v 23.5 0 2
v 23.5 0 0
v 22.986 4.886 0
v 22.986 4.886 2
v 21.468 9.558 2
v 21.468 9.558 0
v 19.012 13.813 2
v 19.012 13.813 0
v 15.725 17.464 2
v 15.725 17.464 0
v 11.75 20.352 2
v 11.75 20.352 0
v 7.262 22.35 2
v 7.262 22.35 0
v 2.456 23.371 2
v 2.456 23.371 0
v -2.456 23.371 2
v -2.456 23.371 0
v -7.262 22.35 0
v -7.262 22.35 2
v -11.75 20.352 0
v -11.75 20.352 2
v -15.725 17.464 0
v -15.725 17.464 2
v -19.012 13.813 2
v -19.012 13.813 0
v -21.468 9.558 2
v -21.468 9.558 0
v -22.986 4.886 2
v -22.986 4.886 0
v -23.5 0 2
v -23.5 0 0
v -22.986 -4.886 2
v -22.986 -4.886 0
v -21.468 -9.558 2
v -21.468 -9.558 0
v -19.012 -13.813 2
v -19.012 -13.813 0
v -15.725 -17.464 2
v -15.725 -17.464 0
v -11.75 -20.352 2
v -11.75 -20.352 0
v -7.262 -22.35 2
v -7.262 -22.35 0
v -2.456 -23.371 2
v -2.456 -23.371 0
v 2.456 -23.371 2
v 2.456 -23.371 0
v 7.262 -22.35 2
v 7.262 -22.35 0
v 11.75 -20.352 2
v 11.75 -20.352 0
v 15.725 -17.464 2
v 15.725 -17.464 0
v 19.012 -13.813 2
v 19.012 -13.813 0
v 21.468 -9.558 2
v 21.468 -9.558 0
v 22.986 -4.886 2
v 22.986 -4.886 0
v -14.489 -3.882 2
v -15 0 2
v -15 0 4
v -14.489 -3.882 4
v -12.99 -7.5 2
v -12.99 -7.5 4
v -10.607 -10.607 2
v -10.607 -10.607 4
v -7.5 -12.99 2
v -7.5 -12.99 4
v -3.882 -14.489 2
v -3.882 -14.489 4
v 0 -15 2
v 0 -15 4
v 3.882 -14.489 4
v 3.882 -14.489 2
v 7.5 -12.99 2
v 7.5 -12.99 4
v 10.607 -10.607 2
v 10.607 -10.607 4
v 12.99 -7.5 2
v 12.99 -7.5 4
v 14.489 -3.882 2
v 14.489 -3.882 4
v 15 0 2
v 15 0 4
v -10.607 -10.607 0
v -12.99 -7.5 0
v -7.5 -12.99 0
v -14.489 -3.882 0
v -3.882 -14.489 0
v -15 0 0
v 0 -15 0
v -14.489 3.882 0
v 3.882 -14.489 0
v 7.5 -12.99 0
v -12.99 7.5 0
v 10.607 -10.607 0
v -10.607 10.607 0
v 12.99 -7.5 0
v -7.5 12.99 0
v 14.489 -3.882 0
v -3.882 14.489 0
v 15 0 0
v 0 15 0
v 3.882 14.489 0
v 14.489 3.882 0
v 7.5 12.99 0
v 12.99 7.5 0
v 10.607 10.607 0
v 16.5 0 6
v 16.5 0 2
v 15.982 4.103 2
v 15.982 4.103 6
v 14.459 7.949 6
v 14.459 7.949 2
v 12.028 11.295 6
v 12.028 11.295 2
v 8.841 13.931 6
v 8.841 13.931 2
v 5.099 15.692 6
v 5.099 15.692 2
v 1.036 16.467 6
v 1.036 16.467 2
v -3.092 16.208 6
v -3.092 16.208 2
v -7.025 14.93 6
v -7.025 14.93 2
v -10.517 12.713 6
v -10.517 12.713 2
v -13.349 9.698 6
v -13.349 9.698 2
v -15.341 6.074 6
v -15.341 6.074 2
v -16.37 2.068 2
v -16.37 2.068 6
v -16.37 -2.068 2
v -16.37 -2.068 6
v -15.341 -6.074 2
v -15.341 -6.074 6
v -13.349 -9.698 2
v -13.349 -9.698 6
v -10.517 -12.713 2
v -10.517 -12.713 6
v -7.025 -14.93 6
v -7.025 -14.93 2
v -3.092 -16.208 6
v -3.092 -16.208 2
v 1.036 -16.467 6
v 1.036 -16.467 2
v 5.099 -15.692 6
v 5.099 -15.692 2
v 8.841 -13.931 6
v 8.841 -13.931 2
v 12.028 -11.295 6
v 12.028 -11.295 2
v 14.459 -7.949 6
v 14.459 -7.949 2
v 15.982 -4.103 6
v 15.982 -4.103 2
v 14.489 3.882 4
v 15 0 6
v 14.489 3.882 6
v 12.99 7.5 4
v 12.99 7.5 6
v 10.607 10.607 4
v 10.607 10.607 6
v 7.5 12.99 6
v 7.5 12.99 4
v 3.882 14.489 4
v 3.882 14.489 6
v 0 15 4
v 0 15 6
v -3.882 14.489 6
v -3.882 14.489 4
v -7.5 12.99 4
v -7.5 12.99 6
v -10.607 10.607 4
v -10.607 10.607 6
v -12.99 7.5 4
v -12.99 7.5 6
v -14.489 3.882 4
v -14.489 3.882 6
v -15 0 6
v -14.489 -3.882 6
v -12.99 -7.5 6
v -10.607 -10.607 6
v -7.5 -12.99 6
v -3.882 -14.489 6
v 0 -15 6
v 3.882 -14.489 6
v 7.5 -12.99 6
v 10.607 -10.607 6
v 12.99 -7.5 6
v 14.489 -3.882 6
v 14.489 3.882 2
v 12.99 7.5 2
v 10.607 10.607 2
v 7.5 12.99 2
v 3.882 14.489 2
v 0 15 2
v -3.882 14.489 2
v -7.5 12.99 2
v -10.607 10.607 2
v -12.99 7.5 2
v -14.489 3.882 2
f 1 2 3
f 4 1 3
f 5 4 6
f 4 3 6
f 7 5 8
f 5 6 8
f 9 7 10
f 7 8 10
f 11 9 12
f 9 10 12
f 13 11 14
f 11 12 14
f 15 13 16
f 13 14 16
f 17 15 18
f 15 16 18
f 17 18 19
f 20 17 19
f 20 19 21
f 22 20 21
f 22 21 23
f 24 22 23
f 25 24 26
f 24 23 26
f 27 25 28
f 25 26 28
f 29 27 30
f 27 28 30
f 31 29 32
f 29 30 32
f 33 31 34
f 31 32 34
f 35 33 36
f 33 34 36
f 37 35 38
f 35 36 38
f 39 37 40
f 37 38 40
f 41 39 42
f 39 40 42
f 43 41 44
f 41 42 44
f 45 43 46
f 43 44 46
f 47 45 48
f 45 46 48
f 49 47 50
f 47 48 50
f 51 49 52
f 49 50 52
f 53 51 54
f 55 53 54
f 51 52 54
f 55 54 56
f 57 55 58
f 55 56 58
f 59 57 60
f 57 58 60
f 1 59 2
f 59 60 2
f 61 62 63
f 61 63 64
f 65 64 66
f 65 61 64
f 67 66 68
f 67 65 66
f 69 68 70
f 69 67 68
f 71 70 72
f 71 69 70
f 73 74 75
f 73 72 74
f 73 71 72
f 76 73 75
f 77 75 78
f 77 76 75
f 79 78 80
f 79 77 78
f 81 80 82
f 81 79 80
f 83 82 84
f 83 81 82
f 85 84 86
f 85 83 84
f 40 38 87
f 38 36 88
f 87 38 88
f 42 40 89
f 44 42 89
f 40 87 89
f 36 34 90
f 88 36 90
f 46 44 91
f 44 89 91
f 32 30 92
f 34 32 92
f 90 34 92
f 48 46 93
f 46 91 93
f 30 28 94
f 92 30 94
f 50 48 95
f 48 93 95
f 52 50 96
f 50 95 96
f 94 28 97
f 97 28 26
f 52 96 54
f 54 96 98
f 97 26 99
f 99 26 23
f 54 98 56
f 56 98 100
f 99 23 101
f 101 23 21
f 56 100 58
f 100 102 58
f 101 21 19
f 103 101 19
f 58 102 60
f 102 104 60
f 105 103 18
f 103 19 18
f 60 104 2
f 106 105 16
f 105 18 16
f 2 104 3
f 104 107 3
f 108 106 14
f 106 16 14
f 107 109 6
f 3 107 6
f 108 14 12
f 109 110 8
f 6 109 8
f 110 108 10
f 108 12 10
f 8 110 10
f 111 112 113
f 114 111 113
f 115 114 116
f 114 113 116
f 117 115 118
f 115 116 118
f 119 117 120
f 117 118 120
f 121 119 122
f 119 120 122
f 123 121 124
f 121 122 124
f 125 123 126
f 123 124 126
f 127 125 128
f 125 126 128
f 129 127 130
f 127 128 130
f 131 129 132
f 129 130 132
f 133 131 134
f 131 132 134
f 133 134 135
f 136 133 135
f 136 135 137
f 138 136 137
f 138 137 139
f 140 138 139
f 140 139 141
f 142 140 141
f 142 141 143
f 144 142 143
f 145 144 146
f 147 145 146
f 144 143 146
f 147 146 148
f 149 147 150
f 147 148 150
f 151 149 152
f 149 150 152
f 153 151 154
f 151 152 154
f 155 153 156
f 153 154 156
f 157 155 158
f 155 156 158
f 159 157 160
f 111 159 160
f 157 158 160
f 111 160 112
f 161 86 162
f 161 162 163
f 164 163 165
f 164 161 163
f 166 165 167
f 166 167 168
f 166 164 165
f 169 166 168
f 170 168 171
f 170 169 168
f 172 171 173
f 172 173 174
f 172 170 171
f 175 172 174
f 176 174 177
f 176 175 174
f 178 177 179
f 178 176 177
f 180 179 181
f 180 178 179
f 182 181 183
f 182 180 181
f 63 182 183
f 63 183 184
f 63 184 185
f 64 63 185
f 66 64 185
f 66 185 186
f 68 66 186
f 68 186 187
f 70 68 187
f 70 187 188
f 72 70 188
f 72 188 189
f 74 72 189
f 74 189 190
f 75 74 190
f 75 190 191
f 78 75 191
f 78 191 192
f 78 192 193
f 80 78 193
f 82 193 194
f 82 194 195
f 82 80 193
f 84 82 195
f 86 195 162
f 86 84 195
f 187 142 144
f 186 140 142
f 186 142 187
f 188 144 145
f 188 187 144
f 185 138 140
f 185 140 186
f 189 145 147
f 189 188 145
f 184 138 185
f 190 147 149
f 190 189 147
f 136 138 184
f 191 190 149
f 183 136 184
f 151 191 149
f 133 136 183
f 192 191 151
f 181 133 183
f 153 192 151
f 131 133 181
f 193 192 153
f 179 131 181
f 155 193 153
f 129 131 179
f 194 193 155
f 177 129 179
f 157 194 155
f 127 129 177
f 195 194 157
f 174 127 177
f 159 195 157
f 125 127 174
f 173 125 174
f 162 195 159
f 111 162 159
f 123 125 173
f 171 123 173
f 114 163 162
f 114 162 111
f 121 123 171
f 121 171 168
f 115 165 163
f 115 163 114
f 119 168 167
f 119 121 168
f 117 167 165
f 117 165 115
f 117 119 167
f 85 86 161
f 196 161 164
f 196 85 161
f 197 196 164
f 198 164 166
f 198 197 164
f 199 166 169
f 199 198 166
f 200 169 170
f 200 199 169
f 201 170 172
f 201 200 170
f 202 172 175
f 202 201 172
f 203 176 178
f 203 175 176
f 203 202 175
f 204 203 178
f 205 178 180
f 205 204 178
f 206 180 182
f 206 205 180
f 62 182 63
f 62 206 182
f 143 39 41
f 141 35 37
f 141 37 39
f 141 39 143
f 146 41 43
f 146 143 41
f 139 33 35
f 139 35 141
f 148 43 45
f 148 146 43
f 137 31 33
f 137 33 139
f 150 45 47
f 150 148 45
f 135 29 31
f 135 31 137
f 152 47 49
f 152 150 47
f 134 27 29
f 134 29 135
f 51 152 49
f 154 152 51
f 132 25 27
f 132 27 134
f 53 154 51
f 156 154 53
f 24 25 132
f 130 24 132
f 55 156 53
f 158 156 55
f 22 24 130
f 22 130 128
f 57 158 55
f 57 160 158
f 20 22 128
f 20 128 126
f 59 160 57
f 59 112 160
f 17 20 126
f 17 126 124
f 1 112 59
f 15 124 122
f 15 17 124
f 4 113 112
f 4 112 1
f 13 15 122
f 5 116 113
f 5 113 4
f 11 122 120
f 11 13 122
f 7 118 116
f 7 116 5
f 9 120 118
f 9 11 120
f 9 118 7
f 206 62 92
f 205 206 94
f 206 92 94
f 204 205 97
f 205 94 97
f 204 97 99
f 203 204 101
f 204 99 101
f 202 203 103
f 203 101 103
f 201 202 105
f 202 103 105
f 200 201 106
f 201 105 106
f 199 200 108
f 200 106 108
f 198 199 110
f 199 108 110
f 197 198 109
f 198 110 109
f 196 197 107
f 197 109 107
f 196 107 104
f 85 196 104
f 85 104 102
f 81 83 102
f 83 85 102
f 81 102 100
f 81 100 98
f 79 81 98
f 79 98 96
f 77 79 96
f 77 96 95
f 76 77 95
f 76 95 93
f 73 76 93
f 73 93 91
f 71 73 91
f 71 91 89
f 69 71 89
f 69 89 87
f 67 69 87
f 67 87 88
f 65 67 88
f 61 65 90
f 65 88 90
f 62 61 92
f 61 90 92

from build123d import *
from build123d.topology import SkipClean

# Parameters (mm, degrees)
SKETCH1_R           = 23.5
BOSS_EXTRUDE1_DEPTH = 2
SKETCH2_R           = 16.5
SKETCH2_R_2         = 15
BOSS_EXTRUDE2_DEPTH = 4
SKETCH3_R           = 15
CUT_EXTRUDE1_DEPTH  = 4


with BuildPart() as part:
    # Sketch1 → Boss-Extrude1 (new body)
    with BuildSketch(Plane.XY):
        Circle(SKETCH1_R)
    extrude(amount=BOSS_EXTRUDE1_DEPTH)

    # Sketch2 → Boss-Extrude2 (add)
    with BuildSketch(Plane.XY.offset(2)):
        Circle(SKETCH2_R)
        Circle(SKETCH2_R_2, mode=Mode.SUBTRACT)
    extrude(amount=BOSS_EXTRUDE2_DEPTH)

    # Sketch3 → Cut-Extrude1 (cut)
    with SkipClean():  # the faces are left unmerged after this step: merging them gives an invalid solid
        with BuildSketch(Plane(origin=(0, 0, 0), x_dir=(-1, 0, 0), z_dir=(0, 0, -1))):
            Circle(SKETCH3_R)
        extrude(amount=-CUT_EXTRUDE1_DEPTH, mode=Mode.SUBTRACT)


solid = part.part
